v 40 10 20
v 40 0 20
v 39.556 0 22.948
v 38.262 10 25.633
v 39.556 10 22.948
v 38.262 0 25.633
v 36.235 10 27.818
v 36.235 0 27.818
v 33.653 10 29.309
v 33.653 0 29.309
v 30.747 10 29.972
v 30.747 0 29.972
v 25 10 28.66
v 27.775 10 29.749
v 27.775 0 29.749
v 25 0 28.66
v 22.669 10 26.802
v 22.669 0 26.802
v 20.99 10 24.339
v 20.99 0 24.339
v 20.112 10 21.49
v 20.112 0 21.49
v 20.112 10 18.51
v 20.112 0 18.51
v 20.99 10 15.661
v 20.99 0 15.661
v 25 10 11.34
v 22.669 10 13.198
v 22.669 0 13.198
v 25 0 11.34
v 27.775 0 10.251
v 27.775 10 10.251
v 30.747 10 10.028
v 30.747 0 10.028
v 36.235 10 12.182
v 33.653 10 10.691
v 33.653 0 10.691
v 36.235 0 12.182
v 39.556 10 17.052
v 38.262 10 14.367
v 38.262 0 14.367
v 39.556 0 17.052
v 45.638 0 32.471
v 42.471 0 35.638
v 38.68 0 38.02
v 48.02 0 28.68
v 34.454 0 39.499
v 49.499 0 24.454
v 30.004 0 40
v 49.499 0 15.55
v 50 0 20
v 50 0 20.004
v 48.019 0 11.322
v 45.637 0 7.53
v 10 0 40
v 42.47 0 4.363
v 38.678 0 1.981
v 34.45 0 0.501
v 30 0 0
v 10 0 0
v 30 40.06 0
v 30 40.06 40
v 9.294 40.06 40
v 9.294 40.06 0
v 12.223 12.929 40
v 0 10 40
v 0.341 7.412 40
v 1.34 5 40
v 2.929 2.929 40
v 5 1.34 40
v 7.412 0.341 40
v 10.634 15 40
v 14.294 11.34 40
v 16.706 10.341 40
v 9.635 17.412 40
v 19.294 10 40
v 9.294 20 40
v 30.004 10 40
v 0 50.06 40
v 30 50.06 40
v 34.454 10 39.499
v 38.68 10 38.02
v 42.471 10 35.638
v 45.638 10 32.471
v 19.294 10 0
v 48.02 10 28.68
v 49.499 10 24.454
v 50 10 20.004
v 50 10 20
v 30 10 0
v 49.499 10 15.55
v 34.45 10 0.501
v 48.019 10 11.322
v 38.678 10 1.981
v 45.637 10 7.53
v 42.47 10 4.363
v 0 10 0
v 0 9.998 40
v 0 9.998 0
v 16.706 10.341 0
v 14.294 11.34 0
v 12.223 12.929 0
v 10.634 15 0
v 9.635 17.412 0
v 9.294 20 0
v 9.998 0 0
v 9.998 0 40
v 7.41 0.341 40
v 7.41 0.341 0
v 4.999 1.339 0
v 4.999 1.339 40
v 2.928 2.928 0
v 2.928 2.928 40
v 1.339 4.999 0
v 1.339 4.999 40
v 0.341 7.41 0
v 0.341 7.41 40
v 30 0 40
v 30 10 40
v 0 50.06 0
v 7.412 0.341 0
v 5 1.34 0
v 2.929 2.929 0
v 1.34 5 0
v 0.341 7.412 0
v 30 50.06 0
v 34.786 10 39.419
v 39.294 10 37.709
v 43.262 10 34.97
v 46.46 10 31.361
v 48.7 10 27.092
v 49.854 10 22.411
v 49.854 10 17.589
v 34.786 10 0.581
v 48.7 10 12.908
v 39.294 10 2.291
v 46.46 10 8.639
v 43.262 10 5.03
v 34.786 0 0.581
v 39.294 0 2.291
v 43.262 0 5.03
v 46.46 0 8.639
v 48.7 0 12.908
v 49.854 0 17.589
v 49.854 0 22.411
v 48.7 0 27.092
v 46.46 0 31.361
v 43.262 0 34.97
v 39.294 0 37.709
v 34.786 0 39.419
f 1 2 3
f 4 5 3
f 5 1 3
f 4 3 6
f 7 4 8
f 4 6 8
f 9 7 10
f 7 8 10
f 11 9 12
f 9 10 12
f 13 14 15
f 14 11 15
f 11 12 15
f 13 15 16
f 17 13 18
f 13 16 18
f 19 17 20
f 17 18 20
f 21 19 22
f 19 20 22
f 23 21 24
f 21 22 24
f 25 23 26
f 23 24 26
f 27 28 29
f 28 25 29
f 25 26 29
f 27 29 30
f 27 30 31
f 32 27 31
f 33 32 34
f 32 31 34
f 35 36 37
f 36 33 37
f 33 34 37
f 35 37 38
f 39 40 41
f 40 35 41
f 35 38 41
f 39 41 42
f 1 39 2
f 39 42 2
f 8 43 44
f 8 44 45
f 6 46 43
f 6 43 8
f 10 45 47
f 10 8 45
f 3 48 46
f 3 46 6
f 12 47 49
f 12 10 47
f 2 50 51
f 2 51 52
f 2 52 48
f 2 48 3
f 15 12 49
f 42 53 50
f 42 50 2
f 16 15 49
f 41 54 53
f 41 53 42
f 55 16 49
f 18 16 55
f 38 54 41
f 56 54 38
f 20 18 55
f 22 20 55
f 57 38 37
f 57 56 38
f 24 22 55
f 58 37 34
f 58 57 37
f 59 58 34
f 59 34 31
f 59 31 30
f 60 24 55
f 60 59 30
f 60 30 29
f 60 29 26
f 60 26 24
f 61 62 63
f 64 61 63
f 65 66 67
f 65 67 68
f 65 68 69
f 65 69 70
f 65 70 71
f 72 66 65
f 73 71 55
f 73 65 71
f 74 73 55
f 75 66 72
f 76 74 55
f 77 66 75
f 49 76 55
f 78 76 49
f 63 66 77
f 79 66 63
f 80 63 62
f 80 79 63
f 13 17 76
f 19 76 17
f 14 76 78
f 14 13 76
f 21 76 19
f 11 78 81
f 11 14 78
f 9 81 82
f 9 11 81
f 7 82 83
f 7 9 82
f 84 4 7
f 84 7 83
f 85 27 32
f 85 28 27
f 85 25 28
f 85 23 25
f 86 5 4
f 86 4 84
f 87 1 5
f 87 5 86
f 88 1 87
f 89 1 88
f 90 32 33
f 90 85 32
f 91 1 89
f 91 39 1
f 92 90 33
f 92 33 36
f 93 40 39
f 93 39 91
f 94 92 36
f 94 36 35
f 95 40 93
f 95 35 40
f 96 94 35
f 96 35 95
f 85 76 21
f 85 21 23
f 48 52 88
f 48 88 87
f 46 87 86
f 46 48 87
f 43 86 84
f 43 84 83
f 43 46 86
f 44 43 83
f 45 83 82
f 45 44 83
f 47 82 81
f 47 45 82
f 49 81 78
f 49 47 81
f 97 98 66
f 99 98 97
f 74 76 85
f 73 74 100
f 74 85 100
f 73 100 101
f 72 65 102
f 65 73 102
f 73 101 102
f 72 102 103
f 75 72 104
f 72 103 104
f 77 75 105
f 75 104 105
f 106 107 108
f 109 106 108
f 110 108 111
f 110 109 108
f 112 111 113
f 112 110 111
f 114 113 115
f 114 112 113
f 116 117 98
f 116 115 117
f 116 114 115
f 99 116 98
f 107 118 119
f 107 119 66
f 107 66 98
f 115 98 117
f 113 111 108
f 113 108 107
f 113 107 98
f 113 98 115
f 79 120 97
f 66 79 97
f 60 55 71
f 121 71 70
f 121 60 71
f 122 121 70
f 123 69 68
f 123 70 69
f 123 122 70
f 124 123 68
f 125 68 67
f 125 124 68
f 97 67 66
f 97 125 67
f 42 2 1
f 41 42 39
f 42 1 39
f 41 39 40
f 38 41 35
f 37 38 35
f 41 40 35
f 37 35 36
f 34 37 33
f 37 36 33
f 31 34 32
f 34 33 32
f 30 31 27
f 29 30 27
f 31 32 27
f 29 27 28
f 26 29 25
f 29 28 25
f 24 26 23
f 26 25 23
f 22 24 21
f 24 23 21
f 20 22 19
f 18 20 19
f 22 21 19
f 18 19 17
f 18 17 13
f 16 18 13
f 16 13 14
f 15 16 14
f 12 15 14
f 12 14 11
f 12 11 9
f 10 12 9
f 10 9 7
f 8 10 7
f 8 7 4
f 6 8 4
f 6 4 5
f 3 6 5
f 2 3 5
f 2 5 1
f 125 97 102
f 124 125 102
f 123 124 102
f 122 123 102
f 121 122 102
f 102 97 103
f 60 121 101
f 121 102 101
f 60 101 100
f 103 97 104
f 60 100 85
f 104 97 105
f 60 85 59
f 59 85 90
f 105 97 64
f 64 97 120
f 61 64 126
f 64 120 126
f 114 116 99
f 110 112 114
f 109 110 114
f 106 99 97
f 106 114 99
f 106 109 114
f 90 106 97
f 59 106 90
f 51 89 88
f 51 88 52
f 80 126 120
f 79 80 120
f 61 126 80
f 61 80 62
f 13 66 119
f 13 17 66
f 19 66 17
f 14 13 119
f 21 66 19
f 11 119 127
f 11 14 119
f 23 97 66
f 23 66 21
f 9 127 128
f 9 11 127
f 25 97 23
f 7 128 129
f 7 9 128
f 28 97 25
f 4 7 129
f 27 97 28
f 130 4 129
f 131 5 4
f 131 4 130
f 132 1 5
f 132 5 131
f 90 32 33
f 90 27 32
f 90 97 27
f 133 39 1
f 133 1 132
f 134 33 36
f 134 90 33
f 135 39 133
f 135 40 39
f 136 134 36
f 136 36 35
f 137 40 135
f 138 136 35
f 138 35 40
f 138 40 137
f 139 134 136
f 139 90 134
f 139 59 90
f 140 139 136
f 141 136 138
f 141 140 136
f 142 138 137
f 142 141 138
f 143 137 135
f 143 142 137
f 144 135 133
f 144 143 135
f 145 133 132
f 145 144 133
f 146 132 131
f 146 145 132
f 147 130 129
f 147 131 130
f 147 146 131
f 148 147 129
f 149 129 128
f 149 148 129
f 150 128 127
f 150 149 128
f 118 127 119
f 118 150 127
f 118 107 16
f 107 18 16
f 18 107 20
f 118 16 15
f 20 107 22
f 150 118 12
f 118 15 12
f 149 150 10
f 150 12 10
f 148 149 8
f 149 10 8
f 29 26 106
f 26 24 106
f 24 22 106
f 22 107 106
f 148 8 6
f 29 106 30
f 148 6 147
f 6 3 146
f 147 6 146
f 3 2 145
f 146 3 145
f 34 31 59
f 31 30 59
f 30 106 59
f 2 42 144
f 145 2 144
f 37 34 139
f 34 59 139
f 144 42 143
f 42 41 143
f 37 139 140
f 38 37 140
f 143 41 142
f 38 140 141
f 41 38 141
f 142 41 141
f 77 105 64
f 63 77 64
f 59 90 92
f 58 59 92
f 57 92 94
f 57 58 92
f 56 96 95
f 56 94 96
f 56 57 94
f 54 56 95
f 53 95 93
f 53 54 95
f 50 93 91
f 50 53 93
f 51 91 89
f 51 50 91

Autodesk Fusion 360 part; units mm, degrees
sketch "Sketch1" plane through (0, 0, 0) normal (0, 1, 0) x (1, 0, 0)
  line L0 (0, 0) -> (30, 0)
  line L1 (30, -40) -> (0, -40)
  line L2 (0, -40) -> (0, 0)
  circle A0 centre (30, -20) radius 10
  arc A1 (30, -40) -> (30, 0) centre (30, -20) ccw
  dimension "d1" = 30
  dimension "d2" = 40
  dimension "d3" = 20
sketch "Sketch2" plane through (0, 0, 0) normal (0, 0, 1) x (1, 0, 0)
  line L0 (10, 0) -> (9.2942, 0)
  line L1 (9.2942, 20) -> (9.2942, 40.06)
  line L2 (9.2942, 50.06) -> (0, 50.06)
  line L3 (0, 50.06) -> (0, 10)
  line L4 (50, 0) -> (9.2942, 0)
  line L5 (19.2942, 10) -> (50, 10)
  line L6 (50, 10) -> (50, 0)
  line L7 (0, 50.06) -> (30, 50.06)
  line L8 (30, 50.06) -> (30, 40.06)
  line L9 (30, 40.06) -> (9.2942, 40.06)
  line L10 (0, 40.06) -> (0, 50.06)
  arc A0 (0, 10) -> (10, 0) centre (10, 10) ccw
  arc A1 (9.2942, 20) -> (19.2942, 10) centre (19.2942, 20) ccw
  dimension "d4" = 50.06
  dimension "d5" = 10
  dimension "d6" = 30
  dimension "d7" = 10
  dimension "d8" = 10
  dimension "d9" = 10
sketch "Sketch3" plane through (0, 0, 0) normal (0, 0, 1) x (1, 0, 0)
sketch "Sketch4" plane through (0, 0, 0) normal (1, 0, 0) x (0, 0, -1)
  line L0 (-40, 10) -> (-40, 50)
  line L1 (-40, 50) -> (0, 50)
  line L2 (0, 50) -> (0, 10)
  line L3 (0, 10) -> (-40, 10)
  line L4 (-40, 10) -> (-40, 50)
  line L5 (-40, 50) -> (0, 50)
  line L6 (0, 50) -> (0, 10)
extrude "Extrude1" add sketch "Sketch2" along normal blind 40 makes body 1
extrude "Extrude2" add sketch "Sketch1" along normal blind 10 separate body makes body 2
fillet "Fillet1" radius 10 1 edges at (0, 0, 20) on bodies 2
fillet "Fillet2" radius 20 1 edges at (50, 5, 0) on bodies 1
fillet "Fillet3" radius 20 1 edges at (50, 5, 40) on bodies 1
cylinder "CylinderPrimitive1" cut diameter 20 height 25 placed x (1, 0, 0) y (0, 0, -1) z (0, 1, 0) at (30, 0, 20) bodies 1
